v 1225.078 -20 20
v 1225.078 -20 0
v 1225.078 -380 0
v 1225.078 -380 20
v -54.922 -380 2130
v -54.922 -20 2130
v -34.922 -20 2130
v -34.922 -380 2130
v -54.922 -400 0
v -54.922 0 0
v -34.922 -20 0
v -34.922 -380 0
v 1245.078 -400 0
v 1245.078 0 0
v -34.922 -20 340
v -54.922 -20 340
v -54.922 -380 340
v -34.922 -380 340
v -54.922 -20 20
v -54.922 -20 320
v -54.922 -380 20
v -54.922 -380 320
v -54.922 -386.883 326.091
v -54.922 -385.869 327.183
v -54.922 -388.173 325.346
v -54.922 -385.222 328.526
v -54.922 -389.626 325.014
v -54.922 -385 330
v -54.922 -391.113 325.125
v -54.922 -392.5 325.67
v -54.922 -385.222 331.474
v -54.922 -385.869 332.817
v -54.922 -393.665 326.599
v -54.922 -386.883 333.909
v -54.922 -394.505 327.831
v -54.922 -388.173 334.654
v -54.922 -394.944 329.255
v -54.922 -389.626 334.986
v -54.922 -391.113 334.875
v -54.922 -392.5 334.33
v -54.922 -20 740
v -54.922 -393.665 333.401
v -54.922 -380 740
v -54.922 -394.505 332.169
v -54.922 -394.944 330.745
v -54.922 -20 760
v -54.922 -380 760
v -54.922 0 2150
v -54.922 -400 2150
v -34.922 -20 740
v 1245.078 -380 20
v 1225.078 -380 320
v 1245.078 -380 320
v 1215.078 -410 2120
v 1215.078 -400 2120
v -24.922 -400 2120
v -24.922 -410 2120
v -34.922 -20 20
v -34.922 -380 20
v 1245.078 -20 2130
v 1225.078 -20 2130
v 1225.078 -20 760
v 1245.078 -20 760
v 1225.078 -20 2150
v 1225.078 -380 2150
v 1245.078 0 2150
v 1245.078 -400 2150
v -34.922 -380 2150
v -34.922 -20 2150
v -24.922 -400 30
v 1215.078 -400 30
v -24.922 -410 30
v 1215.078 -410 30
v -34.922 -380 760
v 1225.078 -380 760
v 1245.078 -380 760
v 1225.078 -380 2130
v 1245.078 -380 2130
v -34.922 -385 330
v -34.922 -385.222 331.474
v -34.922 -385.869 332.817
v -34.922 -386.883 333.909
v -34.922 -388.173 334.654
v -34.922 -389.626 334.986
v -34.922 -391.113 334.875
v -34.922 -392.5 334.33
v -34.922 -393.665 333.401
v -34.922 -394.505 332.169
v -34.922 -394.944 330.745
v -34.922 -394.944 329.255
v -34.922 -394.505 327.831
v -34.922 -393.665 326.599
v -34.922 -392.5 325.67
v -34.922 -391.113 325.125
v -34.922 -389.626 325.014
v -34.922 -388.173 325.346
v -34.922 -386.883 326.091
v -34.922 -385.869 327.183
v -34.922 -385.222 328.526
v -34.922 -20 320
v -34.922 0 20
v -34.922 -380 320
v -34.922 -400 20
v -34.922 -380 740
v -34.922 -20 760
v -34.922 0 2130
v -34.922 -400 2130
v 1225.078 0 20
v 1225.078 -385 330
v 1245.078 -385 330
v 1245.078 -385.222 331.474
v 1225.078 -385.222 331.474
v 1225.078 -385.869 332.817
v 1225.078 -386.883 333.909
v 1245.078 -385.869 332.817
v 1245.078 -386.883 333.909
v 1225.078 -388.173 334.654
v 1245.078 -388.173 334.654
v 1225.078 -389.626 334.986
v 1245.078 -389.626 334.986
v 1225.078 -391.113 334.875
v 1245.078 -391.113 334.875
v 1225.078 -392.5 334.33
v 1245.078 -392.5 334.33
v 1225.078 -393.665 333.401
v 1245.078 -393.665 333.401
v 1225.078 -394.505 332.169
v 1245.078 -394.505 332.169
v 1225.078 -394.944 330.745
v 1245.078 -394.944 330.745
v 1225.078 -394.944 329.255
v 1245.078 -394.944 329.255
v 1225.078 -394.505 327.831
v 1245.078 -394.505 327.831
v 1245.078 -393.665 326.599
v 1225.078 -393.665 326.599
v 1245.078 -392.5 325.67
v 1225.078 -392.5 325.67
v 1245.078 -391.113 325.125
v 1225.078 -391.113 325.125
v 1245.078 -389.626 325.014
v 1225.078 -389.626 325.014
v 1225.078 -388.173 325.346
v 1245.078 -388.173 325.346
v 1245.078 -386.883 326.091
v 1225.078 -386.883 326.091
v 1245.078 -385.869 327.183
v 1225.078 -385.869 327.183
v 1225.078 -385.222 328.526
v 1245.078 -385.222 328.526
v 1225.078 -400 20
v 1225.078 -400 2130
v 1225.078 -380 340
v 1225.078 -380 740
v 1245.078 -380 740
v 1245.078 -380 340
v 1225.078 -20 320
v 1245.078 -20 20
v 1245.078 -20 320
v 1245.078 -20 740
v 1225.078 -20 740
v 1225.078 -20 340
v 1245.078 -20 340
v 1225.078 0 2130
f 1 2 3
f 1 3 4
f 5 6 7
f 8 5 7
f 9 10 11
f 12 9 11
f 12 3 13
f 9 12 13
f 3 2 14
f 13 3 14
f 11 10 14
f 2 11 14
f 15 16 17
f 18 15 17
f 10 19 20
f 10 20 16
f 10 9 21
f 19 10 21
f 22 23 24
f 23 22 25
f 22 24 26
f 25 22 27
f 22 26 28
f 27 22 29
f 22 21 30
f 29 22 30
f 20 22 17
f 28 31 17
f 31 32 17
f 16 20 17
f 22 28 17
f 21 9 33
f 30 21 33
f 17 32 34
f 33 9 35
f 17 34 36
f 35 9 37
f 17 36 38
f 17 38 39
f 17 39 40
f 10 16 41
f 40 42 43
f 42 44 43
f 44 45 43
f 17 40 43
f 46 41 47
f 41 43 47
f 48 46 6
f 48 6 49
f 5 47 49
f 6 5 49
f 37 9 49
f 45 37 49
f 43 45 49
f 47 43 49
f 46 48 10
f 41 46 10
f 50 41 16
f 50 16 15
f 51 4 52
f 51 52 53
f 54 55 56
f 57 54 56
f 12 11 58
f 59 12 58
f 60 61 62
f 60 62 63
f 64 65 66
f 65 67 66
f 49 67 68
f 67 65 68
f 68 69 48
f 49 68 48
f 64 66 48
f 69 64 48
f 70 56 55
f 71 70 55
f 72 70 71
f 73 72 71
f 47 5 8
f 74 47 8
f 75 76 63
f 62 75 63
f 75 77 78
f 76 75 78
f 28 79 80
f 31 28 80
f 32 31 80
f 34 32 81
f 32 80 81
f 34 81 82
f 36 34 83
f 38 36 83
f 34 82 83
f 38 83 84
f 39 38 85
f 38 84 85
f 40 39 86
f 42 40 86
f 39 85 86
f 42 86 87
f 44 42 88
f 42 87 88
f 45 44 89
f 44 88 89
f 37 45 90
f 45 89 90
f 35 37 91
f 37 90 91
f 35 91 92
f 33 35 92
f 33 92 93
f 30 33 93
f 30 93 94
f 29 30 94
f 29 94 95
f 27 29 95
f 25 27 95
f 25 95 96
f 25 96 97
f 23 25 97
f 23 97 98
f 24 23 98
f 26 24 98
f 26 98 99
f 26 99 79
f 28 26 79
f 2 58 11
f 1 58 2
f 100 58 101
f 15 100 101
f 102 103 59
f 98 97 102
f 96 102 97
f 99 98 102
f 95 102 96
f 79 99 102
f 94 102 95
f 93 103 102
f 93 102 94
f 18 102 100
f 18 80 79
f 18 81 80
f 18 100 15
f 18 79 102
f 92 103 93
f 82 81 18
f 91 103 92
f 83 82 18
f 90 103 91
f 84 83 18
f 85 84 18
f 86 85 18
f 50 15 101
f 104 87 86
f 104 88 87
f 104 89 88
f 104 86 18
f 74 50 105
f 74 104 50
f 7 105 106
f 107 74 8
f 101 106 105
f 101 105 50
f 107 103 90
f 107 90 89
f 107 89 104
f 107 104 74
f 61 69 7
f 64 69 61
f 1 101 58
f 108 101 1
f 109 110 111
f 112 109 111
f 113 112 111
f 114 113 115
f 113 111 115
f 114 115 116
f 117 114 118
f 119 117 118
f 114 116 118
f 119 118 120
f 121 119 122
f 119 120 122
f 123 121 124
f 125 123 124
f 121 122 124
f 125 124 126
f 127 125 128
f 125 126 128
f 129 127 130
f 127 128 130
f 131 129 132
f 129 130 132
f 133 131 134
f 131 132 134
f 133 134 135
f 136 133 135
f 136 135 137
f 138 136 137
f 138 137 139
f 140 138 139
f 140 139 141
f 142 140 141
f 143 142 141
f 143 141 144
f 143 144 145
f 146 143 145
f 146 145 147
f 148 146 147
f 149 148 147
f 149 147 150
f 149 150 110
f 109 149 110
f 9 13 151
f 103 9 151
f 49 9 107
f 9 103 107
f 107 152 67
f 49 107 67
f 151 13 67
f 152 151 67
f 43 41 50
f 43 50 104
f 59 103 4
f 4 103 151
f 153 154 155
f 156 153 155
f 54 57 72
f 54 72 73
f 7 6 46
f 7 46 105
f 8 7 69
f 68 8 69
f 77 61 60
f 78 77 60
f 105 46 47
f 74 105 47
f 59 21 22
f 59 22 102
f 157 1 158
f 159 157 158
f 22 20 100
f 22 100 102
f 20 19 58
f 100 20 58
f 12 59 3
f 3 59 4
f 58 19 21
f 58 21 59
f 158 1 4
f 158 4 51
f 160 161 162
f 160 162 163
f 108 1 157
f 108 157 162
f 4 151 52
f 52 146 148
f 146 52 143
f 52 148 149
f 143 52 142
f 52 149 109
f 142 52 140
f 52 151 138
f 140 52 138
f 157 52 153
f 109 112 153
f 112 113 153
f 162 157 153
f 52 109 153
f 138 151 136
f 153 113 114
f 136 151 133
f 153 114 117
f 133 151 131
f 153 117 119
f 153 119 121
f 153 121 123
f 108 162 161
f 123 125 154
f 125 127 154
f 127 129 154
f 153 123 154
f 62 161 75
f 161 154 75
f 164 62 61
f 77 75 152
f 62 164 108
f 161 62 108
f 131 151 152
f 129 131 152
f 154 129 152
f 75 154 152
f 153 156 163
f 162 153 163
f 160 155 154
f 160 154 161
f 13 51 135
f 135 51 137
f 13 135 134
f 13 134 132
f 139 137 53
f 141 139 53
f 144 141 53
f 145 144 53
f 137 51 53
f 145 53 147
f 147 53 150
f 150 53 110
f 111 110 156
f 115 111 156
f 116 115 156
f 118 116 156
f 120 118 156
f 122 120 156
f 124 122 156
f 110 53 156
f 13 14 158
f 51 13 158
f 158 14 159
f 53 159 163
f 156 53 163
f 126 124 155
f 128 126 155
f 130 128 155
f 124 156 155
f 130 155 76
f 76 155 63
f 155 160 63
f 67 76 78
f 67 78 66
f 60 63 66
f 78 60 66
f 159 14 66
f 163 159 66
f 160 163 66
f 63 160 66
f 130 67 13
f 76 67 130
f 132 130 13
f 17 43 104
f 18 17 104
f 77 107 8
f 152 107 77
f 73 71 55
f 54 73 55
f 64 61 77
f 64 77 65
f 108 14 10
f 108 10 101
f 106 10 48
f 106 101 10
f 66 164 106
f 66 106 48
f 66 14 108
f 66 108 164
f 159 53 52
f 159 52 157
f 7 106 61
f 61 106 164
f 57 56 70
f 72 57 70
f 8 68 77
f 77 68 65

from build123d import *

# Parameters (mm, degrees)
F0_W      = 1260
F0_H      = 20
F0_W_2    = 20
F0_H_2    = 2110
F1_DEPTH  = 20
F2_DEPTH  = 400
F3_W      = 20
F3_H      = 2110
F3_W_2    = 1260
F3_H_2    = 20
F4_DEPTH  = 20
F5_W      = 400
F5_H      = 20
F6_DEPTH  = 20
F7_DEPTH  = 20
F8_W      = 360
F8_H      = 20
F9_DEPTH  = 20
F10_R     = 5
F11_DEPTH = 1300.001
F12_W     = 20
F12_H     = 20
F12_W_2   = 1200
F12_H_2   = 2050
F13_DEPTH = 10


with BuildPart() as f1:
    # F0 (on Front) → F1 (new body)
    with BuildSketch(Plane.XZ):
        with Locations((595.0776390731, 2140)):
            Rectangle(F0_W, F0_H)
        with Locations((-44.9223609269, 2140)):
            Rectangle(F0_W_2, F0_H)
        with Locations((-44.9223609269, 1075)):
            Rectangle(F0_W_2, F0_H_2)
        with Locations((1235.0776390731, 2140)):
            Rectangle(F0_W_2, F0_H)
        with Locations((1235.0776390731, 1075)):
            Rectangle(F0_W_2, F0_H_2)
        with Locations((1235.0776390731, 10)):
            Rectangle(F0_W_2, F0_H)
        with Locations((595.0776390731, 10)):
            Rectangle(F0_W, F0_H)
        with Locations((-44.9223609269, 10)):
            Rectangle(F0_W_2, F0_H)
    extrude(amount=F1_DEPTH)

    # F0 (on Front) → F2 (join)
    with BuildSketch(Plane.XZ):
        with Locations((-44.9223609269, 10)):
            Rectangle(F0_W_2, F0_H)
        with Locations((1235.0776390731, 10)):
            Rectangle(F0_W_2, F0_H)
        with Locations((-44.9223609269, 2140)):
            Rectangle(F0_W_2, F0_H)
        with Locations((1235.0776390731, 2140)):
            Rectangle(F0_W_2, F0_H)
    extrude(amount=F2_DEPTH)

    # F3 (on face) → F4 (join)
    with BuildSketch(Plane.XZ.offset(400)):
        with Locations((-44.9223609269, 1075)):
            Rectangle(F3_W, F3_H)
        with Locations((595.0776390731, 10)):
            Rectangle(F3_W_2, F3_H_2)
        with Locations((1235.0776390731, 1075)):
            Rectangle(F3_W, F3_H)
        with Locations((595.0776390731, 2140)):
            Rectangle(F3_W_2, F3_H_2)
    extrude(amount=-F4_DEPTH)

    # F5 (on face) → F6 (join)
    with BuildSketch(Plane.YZ.offset(1245.0776390731)):
        with Locations((-200, 330)):
            Rectangle(F5_W, F5_H)
        with Locations((-200, 750)):
            Rectangle(F5_W, F5_H)
    extrude(amount=-F6_DEPTH)

    # F5 (on face) → F7 (join)
    with BuildSketch(Plane.YZ.offset(1245.0776390731)):
        with Locations((-200, 330)):
            Rectangle(F5_W, F5_H)
        with Locations((-200, 750)):
            Rectangle(F5_W, F5_H)
    extrude(amount=-F7_DEPTH)

    # F8 (on face) → F9 (join)
    with BuildSketch(Plane(origin=(-54.9223609269, 0, 0), x_dir=(0, -1, 0), z_dir=(-1, 0, 0))):
        with Locations((200, 750)):
            Rectangle(F8_W, F8_H)
        with Locations((200, 330)):
            Rectangle(F8_W, F8_H)
    extrude(amount=-F9_DEPTH)

    # F10 (on face) → F11 (cut, through all)
    with BuildSketch(Plane.YZ.offset(1245.0776390731)):
        with Locations((-390, 330)):
            Circle(F10_R)
    extrude(amount=-F11_DEPTH, mode=Mode.SUBTRACT)


with BuildPart() as f13:
    # F12 (on face) → F13 (new body)
    with BuildSketch(Plane.XZ.offset(400)):
        with Locations((1205.0776390731, 2110)):
            Rectangle(F12_W, F12_H)
        with Locations((595.0776390731, 2110)):
            Rectangle(F12_W_2, F12_H)
        with Locations((1205.0776390731, 1075)):
            Rectangle(F12_W, F12_H_2)
        with Locations((-14.9223609269, 2110)):
            Rectangle(F12_W, F12_H)
        with Locations((1205.0776390731, 40)):
            Rectangle(F12_W, F12_H)
        with Locations((-14.9223609269, 1075)):
            Rectangle(F12_W, F12_H_2)
        with Locations((595.0776390731, 40)):
            Rectangle(F12_W_2, F12_H)
        with Locations((-14.9223609269, 40)):
            Rectangle(F12_W, F12_H)
        with Locations((595.0776390731, 1075)):
            Rectangle(F12_W_2, F12_H_2)
    extrude(amount=F13_DEPTH)


solid = Compound([f1.part, f13.part])
